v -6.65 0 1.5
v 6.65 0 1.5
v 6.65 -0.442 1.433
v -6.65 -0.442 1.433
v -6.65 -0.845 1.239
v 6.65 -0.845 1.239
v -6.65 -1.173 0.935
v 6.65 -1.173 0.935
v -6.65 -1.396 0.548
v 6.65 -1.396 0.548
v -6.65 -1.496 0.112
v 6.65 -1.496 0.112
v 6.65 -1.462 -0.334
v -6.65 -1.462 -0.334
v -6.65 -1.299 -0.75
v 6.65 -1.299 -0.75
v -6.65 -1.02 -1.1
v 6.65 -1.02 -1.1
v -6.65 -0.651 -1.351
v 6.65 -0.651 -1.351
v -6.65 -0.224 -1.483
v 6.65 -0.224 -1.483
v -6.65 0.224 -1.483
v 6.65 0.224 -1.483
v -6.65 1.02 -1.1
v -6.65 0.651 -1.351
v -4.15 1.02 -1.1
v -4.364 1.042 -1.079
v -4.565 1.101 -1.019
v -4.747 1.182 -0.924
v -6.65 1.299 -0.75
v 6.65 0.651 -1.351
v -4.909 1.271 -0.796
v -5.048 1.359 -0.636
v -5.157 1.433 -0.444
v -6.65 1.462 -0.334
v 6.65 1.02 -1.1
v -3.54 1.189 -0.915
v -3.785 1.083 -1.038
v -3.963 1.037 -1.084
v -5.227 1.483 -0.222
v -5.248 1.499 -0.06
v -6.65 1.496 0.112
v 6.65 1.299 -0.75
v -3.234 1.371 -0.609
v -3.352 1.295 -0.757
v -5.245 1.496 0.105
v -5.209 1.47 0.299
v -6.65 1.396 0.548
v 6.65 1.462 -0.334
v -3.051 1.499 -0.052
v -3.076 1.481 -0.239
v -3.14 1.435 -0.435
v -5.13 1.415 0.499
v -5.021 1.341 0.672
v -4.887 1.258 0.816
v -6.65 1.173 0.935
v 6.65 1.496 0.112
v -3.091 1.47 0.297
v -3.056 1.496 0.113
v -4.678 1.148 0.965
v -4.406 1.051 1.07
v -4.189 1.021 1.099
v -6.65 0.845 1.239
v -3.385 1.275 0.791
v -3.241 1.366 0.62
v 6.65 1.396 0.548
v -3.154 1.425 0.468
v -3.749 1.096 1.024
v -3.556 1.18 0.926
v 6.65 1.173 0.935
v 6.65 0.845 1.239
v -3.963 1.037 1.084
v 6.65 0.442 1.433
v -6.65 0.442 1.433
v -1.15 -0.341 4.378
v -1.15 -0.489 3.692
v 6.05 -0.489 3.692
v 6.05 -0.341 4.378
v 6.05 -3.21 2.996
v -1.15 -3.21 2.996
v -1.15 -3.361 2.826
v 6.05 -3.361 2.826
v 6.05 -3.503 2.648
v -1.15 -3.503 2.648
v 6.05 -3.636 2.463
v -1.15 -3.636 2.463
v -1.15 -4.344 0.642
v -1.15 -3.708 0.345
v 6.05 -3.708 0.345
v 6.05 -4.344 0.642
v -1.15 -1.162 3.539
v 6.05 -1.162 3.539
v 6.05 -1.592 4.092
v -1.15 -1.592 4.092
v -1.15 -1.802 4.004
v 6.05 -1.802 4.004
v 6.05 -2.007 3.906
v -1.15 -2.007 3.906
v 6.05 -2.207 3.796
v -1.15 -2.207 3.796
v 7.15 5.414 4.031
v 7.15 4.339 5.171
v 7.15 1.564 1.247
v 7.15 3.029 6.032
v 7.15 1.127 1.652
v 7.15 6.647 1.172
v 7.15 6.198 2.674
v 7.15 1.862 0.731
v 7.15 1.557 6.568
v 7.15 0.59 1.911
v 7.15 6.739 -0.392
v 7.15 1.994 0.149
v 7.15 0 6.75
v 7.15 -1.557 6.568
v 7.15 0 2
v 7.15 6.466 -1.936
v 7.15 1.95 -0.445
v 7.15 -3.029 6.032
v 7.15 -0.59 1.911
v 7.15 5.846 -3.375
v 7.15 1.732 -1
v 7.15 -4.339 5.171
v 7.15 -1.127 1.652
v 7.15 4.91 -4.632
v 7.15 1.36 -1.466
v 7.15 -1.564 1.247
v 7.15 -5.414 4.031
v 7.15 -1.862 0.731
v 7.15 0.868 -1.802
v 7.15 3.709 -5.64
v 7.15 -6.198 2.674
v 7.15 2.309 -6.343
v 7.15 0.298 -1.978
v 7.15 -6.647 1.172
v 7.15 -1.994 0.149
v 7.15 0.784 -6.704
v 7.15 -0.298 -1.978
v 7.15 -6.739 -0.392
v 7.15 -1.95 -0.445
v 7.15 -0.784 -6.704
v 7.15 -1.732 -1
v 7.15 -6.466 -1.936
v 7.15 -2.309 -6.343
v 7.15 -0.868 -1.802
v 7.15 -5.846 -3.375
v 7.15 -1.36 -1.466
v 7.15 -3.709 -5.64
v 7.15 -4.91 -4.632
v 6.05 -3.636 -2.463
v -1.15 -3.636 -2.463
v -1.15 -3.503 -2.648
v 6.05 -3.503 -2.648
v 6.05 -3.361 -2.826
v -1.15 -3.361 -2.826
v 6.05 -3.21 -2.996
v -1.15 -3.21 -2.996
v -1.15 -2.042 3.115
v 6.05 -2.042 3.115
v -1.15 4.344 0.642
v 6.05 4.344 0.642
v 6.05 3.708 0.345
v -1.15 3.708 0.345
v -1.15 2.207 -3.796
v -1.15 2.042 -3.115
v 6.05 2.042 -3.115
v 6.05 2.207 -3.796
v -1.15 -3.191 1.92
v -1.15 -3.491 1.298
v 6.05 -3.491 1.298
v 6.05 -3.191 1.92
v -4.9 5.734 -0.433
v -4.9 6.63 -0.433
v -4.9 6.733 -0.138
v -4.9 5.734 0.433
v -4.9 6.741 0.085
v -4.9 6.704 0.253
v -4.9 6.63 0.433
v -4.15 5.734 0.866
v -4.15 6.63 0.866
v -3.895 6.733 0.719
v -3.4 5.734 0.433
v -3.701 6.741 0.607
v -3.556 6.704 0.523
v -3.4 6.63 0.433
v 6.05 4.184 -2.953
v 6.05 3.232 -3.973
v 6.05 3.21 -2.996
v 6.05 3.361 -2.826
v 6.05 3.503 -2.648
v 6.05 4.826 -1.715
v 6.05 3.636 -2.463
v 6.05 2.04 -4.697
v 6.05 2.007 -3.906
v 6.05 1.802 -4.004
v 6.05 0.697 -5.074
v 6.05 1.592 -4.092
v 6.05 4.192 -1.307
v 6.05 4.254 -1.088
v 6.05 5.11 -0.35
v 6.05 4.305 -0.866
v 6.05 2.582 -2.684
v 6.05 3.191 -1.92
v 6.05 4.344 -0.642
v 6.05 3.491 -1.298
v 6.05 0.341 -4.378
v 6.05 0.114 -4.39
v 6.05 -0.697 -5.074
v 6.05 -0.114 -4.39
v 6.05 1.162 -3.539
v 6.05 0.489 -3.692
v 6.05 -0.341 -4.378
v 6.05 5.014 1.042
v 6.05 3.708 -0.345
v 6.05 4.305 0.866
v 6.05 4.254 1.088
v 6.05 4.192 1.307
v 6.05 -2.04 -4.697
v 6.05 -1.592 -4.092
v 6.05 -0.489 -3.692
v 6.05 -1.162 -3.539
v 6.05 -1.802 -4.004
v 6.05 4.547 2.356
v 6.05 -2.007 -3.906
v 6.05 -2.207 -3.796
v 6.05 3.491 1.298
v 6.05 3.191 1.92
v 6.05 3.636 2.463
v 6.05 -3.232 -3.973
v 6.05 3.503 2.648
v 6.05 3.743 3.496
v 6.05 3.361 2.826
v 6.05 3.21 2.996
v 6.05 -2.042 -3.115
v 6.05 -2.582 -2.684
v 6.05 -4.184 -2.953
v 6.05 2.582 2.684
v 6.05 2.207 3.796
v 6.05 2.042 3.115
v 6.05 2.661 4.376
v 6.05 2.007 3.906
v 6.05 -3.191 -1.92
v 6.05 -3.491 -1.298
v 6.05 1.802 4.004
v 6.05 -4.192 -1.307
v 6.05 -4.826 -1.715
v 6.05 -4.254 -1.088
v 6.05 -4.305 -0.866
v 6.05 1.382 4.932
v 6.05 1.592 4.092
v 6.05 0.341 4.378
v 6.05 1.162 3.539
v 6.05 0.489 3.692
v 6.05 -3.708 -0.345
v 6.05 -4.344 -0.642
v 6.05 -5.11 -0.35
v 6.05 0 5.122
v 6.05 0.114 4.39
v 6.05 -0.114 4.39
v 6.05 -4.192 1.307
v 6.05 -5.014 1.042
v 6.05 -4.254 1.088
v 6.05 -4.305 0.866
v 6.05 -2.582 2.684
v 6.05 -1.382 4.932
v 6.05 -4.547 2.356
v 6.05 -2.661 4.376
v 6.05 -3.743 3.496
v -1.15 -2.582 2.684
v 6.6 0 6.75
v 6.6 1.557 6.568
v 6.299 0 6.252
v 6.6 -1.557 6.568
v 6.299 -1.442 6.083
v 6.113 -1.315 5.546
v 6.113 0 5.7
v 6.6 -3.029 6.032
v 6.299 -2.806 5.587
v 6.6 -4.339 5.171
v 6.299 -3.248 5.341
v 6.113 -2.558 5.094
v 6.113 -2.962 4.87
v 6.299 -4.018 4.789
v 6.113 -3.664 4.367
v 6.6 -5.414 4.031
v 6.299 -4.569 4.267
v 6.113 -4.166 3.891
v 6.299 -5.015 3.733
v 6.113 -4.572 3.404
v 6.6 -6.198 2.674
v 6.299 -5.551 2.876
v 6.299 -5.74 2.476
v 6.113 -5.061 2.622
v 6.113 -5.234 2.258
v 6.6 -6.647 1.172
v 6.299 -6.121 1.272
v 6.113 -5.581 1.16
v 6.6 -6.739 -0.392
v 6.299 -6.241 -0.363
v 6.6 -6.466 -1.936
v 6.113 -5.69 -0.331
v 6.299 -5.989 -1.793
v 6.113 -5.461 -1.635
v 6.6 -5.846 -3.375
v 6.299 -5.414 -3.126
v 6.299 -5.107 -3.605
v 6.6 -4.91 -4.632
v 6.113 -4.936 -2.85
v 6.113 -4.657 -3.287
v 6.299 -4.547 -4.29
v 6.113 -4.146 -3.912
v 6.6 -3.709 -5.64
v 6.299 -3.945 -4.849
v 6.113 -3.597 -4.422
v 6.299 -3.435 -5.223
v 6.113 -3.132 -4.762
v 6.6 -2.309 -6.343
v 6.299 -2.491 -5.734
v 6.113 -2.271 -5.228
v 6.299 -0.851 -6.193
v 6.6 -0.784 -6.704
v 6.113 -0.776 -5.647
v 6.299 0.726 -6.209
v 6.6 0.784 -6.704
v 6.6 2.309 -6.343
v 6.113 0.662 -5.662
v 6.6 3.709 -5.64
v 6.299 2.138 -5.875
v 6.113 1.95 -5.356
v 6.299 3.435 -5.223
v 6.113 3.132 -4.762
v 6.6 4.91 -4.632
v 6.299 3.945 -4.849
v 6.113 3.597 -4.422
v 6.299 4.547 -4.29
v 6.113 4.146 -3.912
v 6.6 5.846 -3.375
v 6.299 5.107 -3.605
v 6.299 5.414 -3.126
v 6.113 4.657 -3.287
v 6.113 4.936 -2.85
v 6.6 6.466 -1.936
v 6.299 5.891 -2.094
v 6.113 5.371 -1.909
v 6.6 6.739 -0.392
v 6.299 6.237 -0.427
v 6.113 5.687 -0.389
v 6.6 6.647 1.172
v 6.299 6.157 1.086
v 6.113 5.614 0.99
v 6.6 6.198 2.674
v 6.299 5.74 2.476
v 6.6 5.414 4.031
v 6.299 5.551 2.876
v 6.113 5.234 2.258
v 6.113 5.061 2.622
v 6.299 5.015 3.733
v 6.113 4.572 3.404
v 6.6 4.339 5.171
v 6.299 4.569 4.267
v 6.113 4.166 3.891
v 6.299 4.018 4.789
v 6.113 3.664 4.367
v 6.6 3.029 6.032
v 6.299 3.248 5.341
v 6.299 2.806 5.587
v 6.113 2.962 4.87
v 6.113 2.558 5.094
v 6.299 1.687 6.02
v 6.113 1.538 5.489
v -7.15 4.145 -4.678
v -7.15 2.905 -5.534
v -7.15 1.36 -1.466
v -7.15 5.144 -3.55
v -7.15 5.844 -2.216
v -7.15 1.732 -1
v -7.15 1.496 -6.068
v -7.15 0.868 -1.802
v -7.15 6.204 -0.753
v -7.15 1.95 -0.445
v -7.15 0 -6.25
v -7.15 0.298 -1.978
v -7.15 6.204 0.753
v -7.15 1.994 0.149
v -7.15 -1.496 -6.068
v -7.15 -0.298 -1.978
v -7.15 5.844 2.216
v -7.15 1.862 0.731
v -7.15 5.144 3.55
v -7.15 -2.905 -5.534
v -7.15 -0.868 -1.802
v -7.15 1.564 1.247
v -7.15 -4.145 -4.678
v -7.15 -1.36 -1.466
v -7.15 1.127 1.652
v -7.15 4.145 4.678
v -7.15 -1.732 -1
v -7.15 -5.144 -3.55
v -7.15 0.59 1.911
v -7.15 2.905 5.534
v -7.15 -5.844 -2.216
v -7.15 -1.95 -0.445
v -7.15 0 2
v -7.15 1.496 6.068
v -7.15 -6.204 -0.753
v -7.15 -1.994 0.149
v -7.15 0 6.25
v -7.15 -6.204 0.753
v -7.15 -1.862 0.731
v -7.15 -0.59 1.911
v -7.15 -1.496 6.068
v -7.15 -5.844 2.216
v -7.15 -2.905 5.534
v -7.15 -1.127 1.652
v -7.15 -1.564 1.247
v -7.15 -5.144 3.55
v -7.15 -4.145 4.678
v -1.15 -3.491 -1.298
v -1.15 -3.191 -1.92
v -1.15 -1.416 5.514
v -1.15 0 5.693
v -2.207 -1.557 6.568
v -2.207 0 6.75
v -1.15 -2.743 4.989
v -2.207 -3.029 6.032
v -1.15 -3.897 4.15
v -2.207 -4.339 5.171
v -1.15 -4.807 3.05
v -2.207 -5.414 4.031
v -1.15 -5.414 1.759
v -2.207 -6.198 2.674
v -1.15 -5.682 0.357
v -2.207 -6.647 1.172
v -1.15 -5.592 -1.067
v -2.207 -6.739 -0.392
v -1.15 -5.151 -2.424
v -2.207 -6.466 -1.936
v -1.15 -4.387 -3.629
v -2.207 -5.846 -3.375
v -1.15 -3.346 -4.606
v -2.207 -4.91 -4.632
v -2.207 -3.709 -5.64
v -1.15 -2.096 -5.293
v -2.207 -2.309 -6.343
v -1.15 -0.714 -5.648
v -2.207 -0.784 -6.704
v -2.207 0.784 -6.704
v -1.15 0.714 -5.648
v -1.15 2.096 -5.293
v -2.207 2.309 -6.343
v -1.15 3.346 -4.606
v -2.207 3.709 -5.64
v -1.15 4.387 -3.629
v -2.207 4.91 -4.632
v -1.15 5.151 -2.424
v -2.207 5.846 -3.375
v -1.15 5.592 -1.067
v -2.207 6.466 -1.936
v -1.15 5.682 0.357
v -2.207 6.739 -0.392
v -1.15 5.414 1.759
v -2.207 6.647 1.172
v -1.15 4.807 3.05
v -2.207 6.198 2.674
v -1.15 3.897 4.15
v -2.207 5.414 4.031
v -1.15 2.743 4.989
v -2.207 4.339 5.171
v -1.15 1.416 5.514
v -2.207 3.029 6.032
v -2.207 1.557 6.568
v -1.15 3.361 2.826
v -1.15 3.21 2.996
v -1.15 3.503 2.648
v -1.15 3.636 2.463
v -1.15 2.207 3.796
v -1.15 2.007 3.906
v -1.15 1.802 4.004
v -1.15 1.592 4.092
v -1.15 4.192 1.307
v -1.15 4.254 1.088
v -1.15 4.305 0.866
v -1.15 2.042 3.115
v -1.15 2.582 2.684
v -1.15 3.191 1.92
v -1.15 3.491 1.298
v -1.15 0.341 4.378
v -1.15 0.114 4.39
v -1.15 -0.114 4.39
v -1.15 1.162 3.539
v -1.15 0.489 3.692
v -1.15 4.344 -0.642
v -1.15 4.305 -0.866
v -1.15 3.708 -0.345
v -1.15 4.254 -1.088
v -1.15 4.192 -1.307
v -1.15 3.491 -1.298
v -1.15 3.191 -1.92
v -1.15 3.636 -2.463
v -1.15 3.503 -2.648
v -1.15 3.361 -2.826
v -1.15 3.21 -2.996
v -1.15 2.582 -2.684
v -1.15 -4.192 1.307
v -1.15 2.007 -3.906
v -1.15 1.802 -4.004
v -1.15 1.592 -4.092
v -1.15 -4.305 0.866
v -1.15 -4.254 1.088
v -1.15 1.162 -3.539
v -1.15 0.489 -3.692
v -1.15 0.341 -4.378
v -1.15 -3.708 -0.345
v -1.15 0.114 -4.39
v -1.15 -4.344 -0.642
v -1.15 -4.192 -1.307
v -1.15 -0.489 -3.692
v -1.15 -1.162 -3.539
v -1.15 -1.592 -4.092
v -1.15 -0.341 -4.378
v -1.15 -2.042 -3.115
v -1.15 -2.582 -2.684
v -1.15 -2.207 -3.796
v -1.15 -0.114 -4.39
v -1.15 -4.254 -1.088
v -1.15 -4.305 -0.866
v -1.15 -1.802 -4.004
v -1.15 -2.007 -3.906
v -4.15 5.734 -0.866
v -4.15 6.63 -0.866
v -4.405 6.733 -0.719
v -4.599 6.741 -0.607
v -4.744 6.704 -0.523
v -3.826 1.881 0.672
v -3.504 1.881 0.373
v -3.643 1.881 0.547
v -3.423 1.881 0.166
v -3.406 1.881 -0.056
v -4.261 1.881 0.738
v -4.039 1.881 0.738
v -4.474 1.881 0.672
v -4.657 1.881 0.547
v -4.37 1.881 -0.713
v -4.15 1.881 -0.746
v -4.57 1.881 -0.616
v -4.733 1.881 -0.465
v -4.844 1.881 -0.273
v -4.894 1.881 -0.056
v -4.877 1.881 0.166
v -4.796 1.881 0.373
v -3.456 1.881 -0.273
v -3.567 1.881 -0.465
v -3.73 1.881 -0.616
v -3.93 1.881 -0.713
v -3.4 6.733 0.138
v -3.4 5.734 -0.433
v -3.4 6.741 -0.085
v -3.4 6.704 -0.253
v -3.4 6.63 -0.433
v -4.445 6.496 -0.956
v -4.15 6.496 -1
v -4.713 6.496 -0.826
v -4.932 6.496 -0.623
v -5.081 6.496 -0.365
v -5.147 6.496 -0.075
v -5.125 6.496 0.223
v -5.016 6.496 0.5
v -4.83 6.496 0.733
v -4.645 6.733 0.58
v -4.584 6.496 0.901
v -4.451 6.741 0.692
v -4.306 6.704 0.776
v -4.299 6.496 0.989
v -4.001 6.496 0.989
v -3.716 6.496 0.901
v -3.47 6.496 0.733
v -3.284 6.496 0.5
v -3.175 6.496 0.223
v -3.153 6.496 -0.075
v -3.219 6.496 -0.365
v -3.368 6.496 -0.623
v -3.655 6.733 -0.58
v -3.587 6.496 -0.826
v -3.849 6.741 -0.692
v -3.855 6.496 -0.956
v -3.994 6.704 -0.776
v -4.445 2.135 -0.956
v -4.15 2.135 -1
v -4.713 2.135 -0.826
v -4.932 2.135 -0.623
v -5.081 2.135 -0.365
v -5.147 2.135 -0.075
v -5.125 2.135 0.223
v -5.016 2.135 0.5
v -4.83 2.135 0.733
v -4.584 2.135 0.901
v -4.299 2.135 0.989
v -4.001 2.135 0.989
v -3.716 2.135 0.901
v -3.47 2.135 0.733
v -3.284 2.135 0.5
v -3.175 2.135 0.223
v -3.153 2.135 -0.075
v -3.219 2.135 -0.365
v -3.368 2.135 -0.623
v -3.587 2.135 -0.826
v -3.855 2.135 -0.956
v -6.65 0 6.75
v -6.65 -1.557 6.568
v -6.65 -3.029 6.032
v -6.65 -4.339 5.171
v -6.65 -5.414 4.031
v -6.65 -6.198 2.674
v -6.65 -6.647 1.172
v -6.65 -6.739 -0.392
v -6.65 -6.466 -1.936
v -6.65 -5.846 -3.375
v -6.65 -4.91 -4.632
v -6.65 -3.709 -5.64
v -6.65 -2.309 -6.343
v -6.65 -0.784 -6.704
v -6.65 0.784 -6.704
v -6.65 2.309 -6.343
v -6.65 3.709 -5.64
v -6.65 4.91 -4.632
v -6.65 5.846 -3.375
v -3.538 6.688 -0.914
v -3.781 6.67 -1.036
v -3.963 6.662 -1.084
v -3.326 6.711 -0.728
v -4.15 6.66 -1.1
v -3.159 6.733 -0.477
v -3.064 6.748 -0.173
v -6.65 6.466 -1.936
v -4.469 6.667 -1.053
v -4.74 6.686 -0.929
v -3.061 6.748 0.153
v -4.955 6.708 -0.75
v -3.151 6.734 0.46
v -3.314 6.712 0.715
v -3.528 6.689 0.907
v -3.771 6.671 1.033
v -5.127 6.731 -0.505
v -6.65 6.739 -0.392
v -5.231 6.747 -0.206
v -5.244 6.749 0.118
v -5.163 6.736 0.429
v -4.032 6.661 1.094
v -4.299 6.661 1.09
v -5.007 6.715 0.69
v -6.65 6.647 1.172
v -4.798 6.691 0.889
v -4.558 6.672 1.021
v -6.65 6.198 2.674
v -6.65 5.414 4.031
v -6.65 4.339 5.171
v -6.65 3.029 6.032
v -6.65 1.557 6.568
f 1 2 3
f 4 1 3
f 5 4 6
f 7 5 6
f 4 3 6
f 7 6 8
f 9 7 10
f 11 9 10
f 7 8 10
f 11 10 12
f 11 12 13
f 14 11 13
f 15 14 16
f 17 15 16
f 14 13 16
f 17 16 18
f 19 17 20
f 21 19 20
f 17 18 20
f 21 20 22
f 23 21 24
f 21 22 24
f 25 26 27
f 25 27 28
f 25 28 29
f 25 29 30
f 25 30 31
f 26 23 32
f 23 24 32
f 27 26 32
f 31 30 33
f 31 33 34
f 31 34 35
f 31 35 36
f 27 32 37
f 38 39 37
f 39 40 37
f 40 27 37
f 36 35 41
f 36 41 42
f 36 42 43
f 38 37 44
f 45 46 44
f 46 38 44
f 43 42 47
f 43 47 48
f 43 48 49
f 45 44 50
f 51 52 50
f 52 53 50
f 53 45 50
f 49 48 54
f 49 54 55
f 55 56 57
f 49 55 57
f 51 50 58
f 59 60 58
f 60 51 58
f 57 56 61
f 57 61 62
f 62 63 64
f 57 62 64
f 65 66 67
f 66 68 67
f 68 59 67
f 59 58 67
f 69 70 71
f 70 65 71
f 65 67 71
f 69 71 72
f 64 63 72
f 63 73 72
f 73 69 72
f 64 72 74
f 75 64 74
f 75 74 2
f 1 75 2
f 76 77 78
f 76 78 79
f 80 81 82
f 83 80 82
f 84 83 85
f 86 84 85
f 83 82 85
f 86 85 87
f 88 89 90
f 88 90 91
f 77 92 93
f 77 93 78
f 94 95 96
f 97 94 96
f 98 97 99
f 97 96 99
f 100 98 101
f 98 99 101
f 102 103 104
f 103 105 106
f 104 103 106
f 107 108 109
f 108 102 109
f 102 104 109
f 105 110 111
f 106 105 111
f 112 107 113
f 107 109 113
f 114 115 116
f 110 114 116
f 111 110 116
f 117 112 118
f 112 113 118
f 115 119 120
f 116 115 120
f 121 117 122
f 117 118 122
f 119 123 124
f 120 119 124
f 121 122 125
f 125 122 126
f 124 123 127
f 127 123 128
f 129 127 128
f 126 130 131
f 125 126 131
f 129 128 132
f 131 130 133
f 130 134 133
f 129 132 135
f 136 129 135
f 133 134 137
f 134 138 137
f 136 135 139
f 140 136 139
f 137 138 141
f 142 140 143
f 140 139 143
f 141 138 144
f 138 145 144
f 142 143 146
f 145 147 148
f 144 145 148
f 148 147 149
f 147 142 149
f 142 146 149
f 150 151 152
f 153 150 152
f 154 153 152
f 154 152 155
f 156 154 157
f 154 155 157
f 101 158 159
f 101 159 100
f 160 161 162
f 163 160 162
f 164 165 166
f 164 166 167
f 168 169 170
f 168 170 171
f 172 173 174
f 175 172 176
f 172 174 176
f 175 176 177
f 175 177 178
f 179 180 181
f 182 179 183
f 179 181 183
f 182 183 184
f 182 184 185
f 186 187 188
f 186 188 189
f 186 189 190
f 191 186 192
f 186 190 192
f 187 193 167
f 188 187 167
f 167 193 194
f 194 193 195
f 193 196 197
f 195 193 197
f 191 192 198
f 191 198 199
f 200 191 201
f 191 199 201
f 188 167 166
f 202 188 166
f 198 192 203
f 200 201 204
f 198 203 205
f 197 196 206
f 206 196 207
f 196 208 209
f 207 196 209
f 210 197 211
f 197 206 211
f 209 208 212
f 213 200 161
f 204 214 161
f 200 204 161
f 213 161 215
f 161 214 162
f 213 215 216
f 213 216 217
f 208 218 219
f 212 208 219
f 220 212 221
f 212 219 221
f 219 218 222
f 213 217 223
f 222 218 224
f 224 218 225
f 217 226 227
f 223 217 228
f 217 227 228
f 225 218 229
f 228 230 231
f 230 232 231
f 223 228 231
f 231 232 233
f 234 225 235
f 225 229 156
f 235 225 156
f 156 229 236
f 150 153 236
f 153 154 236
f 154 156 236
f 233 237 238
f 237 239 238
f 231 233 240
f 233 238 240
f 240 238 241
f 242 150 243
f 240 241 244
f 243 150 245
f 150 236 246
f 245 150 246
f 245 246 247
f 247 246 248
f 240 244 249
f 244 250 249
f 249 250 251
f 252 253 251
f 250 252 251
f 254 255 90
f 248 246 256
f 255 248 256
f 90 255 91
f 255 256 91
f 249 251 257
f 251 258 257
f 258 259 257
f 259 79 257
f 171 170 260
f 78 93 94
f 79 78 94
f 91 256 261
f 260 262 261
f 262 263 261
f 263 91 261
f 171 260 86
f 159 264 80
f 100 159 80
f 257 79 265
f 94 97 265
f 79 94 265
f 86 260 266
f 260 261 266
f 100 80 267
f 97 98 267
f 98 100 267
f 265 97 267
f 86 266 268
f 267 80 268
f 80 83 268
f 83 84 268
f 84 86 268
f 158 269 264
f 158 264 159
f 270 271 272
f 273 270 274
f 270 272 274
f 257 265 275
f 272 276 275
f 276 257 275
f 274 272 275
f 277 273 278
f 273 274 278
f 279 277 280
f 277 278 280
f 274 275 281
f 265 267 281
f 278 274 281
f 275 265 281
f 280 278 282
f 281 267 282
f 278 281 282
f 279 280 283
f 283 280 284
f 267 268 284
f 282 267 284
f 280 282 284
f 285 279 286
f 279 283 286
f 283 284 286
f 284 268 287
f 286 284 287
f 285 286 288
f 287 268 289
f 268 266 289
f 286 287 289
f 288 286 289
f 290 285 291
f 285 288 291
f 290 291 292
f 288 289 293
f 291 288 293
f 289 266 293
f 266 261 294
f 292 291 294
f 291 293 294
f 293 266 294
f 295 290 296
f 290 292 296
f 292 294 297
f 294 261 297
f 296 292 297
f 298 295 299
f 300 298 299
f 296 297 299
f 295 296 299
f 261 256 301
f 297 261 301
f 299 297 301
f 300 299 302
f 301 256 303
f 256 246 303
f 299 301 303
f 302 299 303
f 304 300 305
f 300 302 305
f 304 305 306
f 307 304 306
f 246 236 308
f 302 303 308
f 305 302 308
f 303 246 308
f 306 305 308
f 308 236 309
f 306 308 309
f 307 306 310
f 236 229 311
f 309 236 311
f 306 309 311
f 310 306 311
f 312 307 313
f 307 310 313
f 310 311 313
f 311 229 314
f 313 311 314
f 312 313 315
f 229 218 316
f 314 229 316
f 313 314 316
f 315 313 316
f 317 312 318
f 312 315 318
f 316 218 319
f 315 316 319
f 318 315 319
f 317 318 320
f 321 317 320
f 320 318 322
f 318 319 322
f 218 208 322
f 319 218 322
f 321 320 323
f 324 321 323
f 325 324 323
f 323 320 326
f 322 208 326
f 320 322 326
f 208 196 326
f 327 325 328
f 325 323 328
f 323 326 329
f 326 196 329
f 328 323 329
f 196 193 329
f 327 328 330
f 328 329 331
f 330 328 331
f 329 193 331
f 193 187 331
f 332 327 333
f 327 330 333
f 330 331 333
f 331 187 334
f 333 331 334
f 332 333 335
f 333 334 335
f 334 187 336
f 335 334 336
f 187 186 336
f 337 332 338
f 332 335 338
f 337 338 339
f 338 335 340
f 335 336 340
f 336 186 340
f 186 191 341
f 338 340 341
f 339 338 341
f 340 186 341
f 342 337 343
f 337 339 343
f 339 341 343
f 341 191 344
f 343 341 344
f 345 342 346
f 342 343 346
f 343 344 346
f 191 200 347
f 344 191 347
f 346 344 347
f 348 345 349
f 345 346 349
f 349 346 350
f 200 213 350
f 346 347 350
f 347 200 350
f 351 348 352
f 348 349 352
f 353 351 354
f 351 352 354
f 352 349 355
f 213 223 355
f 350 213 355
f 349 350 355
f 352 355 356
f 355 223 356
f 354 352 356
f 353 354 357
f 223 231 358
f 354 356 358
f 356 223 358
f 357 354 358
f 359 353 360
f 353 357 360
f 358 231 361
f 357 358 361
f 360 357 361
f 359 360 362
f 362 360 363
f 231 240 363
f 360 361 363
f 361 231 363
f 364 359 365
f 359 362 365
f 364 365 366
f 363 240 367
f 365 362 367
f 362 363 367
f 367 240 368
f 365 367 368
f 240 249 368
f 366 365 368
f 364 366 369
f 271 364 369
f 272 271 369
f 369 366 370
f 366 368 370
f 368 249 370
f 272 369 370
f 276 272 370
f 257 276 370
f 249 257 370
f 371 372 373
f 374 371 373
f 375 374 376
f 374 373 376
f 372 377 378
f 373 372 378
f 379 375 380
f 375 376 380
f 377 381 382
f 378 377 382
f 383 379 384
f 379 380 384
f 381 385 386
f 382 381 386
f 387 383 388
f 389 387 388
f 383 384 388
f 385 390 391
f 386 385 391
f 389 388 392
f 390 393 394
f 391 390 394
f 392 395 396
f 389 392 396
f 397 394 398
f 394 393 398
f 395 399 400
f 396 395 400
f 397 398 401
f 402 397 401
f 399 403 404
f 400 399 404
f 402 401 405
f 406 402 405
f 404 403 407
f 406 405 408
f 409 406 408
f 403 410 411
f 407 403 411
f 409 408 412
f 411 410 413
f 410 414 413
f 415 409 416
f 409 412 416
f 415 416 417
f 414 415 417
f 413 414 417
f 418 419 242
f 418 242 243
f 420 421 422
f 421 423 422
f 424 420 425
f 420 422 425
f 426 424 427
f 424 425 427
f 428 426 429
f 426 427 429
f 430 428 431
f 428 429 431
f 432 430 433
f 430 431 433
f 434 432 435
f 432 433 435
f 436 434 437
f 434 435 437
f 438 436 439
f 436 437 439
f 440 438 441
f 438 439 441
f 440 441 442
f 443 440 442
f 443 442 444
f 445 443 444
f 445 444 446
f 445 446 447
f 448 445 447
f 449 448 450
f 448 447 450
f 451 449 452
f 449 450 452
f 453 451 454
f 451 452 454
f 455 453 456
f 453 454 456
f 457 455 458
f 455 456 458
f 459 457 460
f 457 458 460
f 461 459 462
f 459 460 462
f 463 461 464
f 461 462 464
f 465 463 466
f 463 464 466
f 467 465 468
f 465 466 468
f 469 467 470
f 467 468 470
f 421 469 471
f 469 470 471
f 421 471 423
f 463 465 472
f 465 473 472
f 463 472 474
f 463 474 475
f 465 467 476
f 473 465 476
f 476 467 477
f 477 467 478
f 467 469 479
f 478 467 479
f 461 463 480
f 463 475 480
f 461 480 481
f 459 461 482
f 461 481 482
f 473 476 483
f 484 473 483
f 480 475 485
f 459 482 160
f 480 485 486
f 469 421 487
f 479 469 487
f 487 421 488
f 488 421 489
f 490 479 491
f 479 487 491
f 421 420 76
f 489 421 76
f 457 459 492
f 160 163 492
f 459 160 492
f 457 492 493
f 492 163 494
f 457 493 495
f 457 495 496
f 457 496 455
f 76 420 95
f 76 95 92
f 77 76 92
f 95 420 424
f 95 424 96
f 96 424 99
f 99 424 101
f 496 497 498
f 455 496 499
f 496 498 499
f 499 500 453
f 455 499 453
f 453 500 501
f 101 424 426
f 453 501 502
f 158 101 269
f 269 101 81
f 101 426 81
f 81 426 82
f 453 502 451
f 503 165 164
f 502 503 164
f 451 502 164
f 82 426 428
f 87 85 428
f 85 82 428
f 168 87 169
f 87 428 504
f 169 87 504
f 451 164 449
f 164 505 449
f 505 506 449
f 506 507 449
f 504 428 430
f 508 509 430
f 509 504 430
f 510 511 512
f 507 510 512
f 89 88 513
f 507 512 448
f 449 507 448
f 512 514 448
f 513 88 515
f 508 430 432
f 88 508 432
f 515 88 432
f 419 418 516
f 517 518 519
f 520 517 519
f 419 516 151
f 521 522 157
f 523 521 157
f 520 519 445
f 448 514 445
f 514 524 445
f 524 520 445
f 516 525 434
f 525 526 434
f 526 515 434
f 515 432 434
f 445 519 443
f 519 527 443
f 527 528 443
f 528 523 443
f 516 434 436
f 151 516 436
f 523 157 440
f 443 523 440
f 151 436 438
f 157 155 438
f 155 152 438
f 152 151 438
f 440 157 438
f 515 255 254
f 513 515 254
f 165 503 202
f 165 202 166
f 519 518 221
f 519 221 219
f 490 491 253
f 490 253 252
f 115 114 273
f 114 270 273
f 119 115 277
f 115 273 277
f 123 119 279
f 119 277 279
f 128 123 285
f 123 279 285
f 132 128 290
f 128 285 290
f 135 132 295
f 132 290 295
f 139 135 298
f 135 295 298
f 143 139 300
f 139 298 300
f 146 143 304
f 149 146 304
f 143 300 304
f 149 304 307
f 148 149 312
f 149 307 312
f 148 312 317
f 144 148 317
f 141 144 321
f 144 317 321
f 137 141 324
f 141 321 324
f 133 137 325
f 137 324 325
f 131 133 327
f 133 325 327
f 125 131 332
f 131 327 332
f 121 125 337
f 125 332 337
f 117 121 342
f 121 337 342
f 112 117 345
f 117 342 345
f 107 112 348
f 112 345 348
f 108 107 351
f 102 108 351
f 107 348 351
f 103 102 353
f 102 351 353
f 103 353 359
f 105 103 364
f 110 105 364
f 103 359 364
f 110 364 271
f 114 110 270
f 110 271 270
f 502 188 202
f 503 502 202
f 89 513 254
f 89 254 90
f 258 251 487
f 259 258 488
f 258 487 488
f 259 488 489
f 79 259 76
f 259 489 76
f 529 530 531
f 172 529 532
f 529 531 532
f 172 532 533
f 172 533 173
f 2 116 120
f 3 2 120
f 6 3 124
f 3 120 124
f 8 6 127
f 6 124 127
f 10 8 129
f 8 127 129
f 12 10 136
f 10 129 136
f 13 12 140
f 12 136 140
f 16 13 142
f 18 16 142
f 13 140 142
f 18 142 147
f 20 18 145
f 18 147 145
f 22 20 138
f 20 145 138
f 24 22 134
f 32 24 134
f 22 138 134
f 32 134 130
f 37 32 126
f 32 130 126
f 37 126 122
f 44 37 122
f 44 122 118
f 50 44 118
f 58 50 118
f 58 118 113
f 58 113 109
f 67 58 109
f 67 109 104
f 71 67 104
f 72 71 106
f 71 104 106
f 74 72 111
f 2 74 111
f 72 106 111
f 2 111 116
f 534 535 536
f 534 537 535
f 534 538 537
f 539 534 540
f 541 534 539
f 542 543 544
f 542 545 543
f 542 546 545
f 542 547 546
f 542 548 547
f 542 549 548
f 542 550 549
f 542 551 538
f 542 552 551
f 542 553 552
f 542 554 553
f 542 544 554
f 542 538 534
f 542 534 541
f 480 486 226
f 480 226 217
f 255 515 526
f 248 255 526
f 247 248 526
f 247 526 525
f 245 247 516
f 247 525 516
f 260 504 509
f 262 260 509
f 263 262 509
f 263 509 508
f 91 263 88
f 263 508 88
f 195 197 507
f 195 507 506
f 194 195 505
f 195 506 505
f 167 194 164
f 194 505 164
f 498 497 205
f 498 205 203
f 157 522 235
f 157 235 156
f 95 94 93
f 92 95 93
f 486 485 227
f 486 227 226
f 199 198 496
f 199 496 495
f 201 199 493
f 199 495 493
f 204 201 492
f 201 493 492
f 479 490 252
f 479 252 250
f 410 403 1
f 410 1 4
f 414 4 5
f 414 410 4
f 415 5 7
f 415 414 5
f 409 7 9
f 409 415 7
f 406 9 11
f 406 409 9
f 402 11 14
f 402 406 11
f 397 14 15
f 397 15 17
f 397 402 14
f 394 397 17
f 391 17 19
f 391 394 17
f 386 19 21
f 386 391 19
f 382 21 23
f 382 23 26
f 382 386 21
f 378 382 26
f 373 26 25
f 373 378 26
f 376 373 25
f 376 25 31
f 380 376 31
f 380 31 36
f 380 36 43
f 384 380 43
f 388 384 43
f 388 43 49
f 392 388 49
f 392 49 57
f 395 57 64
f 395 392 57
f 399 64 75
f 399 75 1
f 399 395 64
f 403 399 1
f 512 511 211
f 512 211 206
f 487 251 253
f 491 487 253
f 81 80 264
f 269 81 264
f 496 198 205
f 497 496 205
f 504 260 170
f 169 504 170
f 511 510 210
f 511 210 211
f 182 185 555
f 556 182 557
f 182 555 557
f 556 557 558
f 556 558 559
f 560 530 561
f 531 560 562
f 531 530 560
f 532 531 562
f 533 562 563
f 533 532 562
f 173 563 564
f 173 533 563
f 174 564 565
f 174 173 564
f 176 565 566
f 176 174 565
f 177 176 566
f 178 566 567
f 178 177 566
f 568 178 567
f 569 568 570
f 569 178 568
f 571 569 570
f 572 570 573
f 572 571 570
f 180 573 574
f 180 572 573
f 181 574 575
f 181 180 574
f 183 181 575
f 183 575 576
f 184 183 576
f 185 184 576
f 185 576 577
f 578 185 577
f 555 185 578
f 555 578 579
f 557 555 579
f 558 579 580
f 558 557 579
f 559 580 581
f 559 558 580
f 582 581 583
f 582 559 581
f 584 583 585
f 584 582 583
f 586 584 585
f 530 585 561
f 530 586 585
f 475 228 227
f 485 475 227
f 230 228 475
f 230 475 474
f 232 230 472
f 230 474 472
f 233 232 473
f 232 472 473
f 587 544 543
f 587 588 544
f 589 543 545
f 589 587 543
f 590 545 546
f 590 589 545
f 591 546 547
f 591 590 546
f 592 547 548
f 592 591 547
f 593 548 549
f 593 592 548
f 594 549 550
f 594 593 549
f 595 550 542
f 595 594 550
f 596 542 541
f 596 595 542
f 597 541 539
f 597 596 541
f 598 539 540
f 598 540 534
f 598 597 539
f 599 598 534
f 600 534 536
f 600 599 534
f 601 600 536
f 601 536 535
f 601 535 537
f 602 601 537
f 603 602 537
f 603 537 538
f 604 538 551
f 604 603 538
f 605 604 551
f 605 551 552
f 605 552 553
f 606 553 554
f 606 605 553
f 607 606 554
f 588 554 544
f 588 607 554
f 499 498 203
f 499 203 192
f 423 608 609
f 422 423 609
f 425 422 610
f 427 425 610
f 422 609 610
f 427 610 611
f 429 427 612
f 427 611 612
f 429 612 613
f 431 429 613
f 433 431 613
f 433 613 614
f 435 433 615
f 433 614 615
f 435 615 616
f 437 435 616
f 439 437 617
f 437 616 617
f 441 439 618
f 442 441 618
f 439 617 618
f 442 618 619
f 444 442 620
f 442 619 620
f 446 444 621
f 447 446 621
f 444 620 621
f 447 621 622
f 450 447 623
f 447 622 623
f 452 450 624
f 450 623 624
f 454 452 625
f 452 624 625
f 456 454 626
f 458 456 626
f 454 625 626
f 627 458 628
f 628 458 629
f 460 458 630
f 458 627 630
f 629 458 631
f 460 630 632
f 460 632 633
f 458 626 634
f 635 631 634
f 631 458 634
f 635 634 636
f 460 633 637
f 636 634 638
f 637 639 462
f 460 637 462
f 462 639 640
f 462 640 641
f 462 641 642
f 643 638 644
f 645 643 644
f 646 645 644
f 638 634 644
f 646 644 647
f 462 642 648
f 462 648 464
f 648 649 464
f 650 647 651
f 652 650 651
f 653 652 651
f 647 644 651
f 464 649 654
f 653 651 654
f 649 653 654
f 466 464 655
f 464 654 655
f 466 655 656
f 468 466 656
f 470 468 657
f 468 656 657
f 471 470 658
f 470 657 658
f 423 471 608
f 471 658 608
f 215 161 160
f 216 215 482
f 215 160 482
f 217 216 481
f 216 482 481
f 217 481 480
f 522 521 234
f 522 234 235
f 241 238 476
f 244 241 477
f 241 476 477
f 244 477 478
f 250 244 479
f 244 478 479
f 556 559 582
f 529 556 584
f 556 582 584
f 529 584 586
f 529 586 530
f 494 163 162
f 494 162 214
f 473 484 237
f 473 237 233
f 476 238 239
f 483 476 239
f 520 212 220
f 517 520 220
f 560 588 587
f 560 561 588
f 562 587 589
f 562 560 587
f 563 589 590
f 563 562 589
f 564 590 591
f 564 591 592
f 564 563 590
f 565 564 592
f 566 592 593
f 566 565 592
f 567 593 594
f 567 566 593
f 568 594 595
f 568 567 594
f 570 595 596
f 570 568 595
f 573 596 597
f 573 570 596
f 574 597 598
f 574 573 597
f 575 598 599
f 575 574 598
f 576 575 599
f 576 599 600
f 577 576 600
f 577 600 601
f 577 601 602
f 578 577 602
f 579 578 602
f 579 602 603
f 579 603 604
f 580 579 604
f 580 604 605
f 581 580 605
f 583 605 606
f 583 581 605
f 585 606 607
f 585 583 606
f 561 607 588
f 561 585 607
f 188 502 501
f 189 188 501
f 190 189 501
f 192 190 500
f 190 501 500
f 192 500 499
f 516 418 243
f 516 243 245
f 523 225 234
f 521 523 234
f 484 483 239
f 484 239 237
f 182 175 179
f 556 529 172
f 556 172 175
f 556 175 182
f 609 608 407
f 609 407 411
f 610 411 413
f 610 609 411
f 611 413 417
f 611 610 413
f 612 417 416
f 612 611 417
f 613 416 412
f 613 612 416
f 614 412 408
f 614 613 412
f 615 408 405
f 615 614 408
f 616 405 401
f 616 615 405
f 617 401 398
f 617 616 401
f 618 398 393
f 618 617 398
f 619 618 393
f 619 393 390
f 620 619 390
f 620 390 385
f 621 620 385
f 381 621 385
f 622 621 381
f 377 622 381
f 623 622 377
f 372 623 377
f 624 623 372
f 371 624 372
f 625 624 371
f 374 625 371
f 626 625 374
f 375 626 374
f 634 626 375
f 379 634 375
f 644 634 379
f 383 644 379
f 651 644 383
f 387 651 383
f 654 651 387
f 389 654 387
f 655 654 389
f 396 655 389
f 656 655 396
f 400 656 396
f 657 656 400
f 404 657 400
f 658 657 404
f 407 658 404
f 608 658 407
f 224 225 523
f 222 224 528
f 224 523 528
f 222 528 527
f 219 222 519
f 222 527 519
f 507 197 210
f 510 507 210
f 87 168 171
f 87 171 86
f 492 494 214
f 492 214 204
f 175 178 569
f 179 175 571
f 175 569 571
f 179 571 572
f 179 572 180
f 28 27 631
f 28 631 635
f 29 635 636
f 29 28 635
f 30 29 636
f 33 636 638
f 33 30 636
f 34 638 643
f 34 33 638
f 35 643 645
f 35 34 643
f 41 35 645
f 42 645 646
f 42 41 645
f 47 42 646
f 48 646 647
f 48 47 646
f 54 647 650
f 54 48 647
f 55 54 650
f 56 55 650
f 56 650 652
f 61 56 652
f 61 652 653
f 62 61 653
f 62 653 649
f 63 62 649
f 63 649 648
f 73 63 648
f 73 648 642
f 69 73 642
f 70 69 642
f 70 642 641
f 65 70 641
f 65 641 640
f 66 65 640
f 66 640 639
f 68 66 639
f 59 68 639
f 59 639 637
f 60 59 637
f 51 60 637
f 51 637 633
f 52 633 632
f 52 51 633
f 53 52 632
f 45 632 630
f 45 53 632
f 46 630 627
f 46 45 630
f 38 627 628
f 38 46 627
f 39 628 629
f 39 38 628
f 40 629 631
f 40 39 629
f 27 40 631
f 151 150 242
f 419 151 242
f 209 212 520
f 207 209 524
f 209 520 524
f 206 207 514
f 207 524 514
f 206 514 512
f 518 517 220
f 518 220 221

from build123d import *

# Parameters (mm, degrees)
SKETCH4_R          = 4.55
SKETCH4_R_2        = 4.39125
CUT_EXTRUDE2_DEPTH = 7.2
CUT_EXTRUDE1_DEPTH = 7.2
CIRPATTERN1_COUNT  = 14
SKETCH6_R          = 1.1
CUT_EXTRUDE3_DEPTH = 12.926755636
CUT_EXTRUDE4_DEPTH = 1.016
CHAMFER1_SIZE      = 0.5


with BuildPart() as part:
    # Sketch1 → Revolve1 (revolve)
    with BuildSketch(Plane.XY, mode=Mode.PRIVATE) as revolve1_sk:
        with BuildLine():
            Line((-7.15, 1.5), (7.15, 1.5))
            Line((7.15, 1.5), (7.15, 6.75))
            Line((7.15, 6.75), (6.6, 6.75))
            ThreePointArc((6.6, 6.75), (6.191212109, 5.980934734), (6.05, 5.1215))
            Line((6.05, 5.1215), (6.05, 4.55))
            Line((6.05, 4.55), (-1.15, 4.55))
            Line((-1.15, 4.55), (-1.15, 5.693))
            Line((-1.15, 5.693), (-2.207, 6.75))
            Line((-2.207, 6.75), (-7.15, 6.75))
            Line((-7.15, 6.75), (-7.15, 1.5))
        make_face()
    revolve(revolve1_sk.sketch.rotate(Axis((-7.15, 0, 0), (1, 0, 0)), 90), axis=Axis((-7.15, 0, 0), (1, 0, 0)))

    # Sketch4 → Cut-Extrude2 (cut)
    with BuildSketch(Plane(origin=(-1.15, 0, 0), x_dir=(0, 0, -1), z_dir=(1, 0, 0))):
        Circle(SKETCH4_R)
        Circle(SKETCH4_R_2, mode=Mode.SUBTRACT)
    extrude(amount=CUT_EXTRUDE2_DEPTH, mode=Mode.SUBTRACT)

    # Sketch3 → Cut-Extrude1 (cut)
    with BuildSketch(Plane(origin=(-1.15, 0, 0), x_dir=(0, 0, -1), z_dir=(1, 0, 0))):
        with BuildLine():
            Line((-0.641624805, 4.344121795), (-0.345214105, 3.708466998))
            Line((-0.345214105, 3.708466998), (0.345214105, 3.708466998))
            Line((0.345214105, 3.708466998), (0.641624805, 4.344121795))
            ThreePointArc((0.641624805, 4.344121795), (0, 4.39125), (-0.641624805, 4.344121795))
        make_face()
    cut_extrude1 = extrude(amount=CUT_EXTRUDE1_DEPTH, mode=Mode.SUBTRACT)

    # CirPattern1: Cut-Extrude1 ×14 about axis
    cirpattern1_axis = Axis((0, 0, 0), (1, 0, 0))
    for i in range(1, CIRPATTERN1_COUNT):
        add(cut_extrude1.rotate(cirpattern1_axis, i * 360 / CIRPATTERN1_COUNT), mode=Mode.SUBTRACT)

    # Sketch6 → Cut-Extrude3 (cut, through all)
    with BuildSketch(Plane(origin=(0, 0, 0), x_dir=(1, 0, 0), z_dir=(0, 1, 0))):
        with Locations(Location((-4.15, 0, 0), (0, 0, 90))):
            Circle(SKETCH6_R)
    extrude(amount=CUT_EXTRUDE3_DEPTH, mode=Mode.SUBTRACT)

    # Chamfer1
    chamfer1_edges = [part.edges().sort_by_distance(p)[0] for p in [
        (-7.15, 0, -6.75),
        (-7.15, 0, -1.5),
        (7.15, 0, -1.5),
    ]]
    chamfer(chamfer1_edges, length=CHAMFER1_SIZE)


with BuildPart() as body_2:
    # Sketch7 → Revolve2 (revolve)
    with BuildSketch(Plane.XY, mode=Mode.PRIVATE) as revolve2_sk:
        Polygon((-4.896, 6.75), (-4.15, 6.75), (-4.15, 1.881), (-4.896, 1.881), (-5.15, 2.135), (-5.15, 6.496), align=None)
    revolve(revolve2_sk.sketch.rotate(Axis((-4.15, 1.881, 0), (0, 1, 0)), 270), axis=Axis((-4.15, 1.881, 0), (0, 1, 0)))

    # Sketch8 → Cut-Extrude4 (cut)
    with BuildSketch(Plane(origin=(0, 6.75, 0), x_dir=(1, 0, 0), z_dir=(0, 1, 0))):
        Polygon((-4.15, 0.866025404), (-4.9, 0.433012702), (-4.9, -0.433012702), (-4.15, -0.866025404), (-3.4, -0.433012702), (-3.4, 0.433012702), align=None)
    extrude(amount=-CUT_EXTRUDE4_DEPTH, mode=Mode.SUBTRACT)


solid = Compound([part.part, body_2.part])
